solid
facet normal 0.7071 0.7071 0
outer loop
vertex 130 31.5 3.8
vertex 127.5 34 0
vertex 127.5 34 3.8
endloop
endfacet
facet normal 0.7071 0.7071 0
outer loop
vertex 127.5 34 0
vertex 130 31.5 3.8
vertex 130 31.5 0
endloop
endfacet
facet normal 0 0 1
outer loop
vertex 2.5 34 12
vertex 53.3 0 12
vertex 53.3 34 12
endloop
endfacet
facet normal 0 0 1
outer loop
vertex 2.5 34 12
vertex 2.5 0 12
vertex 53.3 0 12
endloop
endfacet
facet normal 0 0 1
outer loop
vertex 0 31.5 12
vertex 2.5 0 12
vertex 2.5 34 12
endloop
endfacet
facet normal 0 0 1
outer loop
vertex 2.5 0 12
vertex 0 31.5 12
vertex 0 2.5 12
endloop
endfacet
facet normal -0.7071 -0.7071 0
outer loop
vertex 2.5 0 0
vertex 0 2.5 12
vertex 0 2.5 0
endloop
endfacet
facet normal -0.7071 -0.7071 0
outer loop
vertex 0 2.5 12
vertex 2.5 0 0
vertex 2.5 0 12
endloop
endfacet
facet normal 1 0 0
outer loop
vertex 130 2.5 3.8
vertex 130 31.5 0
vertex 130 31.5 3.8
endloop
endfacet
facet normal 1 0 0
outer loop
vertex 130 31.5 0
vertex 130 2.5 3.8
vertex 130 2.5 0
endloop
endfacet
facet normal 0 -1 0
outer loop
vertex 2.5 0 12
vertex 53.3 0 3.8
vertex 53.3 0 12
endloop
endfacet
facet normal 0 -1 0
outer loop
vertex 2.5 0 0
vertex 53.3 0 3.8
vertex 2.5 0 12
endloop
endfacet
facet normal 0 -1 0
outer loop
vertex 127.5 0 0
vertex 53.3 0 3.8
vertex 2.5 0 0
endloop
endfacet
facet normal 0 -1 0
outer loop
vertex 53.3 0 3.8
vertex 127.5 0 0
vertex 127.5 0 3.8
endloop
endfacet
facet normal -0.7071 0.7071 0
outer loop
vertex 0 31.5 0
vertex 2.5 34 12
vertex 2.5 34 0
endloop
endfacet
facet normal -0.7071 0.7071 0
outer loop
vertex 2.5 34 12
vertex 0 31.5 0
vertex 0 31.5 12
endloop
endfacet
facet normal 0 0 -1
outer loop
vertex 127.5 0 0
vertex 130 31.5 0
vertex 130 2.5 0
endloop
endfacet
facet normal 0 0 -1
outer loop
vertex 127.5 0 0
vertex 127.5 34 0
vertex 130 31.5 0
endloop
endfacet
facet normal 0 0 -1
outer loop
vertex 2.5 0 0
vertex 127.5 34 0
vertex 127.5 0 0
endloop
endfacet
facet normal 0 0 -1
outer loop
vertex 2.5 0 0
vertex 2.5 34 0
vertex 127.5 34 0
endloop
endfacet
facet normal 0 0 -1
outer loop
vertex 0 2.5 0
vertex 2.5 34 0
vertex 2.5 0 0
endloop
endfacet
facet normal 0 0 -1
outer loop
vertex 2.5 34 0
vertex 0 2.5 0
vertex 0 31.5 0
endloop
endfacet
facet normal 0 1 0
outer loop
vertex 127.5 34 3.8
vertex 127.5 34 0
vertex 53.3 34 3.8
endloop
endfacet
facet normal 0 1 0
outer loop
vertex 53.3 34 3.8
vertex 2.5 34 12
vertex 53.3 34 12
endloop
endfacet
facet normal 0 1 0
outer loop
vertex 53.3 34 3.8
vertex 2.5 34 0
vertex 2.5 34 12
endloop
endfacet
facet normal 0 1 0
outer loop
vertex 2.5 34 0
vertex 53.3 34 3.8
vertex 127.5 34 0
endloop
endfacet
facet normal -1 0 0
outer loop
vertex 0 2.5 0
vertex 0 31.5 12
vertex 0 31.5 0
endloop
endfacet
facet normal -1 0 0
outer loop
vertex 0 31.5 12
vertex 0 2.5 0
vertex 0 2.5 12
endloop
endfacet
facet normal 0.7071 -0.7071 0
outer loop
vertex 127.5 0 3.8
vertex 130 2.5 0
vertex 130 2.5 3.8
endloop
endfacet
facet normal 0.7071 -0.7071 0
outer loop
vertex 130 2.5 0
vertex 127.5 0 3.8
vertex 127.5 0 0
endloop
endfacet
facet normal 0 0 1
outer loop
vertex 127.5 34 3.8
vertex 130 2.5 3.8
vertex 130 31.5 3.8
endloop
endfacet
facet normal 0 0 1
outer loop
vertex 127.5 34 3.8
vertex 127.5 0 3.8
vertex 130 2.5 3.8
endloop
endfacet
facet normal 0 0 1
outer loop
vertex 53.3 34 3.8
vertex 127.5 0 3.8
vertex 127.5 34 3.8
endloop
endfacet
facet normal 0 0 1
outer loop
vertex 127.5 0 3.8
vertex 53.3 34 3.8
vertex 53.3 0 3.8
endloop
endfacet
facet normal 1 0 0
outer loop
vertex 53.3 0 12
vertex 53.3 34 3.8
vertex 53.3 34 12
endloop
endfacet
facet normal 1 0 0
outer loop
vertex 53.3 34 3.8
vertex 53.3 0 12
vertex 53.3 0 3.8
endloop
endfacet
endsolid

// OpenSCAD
$fn = 32;

// ----------------------------------------------------------------------
// Stepped bar: endstep, 130 x 34 x 12/3.8 mm
// ----------------------------------------------------------------------

// --- parameters (mm) ---
bar_l = 130;              // bar length, X
bar_w = 34;               // bar width, Y
plate_t = 12;             // thickness of the thick zone, Z
thin_t = 3.8;             // thickness of the thin zone
corner_c = 2.5;           // corner chamfer of the bar
step_cut = 8.2;           // material removed from the thin zone
step_x = 53.3;            // step position from the left end
depth_1 = 8.2;            // depth of cut 1 from the top face

profile = [[2.5, 0], [127.5, 0], [130, 2.5], [130, 31.5], [127.5, 34], [2.5, 34], [0, 31.5], [0, 2.5]];  // primary outline, 8 points, counter clockwise
void_1 = [[53.3, -1], [131, -1], [131, 35], [53.3, 35]];  // thin zone beyond the step, 4 points

// --- the one profile operation ---
difference() {
  linear_extrude(height = plate_t) polygon(points = profile);
  translate([0, 0, plate_t - depth_1])
    linear_extrude(height = depth_1 + 1) polygon(points = void_1);
}
